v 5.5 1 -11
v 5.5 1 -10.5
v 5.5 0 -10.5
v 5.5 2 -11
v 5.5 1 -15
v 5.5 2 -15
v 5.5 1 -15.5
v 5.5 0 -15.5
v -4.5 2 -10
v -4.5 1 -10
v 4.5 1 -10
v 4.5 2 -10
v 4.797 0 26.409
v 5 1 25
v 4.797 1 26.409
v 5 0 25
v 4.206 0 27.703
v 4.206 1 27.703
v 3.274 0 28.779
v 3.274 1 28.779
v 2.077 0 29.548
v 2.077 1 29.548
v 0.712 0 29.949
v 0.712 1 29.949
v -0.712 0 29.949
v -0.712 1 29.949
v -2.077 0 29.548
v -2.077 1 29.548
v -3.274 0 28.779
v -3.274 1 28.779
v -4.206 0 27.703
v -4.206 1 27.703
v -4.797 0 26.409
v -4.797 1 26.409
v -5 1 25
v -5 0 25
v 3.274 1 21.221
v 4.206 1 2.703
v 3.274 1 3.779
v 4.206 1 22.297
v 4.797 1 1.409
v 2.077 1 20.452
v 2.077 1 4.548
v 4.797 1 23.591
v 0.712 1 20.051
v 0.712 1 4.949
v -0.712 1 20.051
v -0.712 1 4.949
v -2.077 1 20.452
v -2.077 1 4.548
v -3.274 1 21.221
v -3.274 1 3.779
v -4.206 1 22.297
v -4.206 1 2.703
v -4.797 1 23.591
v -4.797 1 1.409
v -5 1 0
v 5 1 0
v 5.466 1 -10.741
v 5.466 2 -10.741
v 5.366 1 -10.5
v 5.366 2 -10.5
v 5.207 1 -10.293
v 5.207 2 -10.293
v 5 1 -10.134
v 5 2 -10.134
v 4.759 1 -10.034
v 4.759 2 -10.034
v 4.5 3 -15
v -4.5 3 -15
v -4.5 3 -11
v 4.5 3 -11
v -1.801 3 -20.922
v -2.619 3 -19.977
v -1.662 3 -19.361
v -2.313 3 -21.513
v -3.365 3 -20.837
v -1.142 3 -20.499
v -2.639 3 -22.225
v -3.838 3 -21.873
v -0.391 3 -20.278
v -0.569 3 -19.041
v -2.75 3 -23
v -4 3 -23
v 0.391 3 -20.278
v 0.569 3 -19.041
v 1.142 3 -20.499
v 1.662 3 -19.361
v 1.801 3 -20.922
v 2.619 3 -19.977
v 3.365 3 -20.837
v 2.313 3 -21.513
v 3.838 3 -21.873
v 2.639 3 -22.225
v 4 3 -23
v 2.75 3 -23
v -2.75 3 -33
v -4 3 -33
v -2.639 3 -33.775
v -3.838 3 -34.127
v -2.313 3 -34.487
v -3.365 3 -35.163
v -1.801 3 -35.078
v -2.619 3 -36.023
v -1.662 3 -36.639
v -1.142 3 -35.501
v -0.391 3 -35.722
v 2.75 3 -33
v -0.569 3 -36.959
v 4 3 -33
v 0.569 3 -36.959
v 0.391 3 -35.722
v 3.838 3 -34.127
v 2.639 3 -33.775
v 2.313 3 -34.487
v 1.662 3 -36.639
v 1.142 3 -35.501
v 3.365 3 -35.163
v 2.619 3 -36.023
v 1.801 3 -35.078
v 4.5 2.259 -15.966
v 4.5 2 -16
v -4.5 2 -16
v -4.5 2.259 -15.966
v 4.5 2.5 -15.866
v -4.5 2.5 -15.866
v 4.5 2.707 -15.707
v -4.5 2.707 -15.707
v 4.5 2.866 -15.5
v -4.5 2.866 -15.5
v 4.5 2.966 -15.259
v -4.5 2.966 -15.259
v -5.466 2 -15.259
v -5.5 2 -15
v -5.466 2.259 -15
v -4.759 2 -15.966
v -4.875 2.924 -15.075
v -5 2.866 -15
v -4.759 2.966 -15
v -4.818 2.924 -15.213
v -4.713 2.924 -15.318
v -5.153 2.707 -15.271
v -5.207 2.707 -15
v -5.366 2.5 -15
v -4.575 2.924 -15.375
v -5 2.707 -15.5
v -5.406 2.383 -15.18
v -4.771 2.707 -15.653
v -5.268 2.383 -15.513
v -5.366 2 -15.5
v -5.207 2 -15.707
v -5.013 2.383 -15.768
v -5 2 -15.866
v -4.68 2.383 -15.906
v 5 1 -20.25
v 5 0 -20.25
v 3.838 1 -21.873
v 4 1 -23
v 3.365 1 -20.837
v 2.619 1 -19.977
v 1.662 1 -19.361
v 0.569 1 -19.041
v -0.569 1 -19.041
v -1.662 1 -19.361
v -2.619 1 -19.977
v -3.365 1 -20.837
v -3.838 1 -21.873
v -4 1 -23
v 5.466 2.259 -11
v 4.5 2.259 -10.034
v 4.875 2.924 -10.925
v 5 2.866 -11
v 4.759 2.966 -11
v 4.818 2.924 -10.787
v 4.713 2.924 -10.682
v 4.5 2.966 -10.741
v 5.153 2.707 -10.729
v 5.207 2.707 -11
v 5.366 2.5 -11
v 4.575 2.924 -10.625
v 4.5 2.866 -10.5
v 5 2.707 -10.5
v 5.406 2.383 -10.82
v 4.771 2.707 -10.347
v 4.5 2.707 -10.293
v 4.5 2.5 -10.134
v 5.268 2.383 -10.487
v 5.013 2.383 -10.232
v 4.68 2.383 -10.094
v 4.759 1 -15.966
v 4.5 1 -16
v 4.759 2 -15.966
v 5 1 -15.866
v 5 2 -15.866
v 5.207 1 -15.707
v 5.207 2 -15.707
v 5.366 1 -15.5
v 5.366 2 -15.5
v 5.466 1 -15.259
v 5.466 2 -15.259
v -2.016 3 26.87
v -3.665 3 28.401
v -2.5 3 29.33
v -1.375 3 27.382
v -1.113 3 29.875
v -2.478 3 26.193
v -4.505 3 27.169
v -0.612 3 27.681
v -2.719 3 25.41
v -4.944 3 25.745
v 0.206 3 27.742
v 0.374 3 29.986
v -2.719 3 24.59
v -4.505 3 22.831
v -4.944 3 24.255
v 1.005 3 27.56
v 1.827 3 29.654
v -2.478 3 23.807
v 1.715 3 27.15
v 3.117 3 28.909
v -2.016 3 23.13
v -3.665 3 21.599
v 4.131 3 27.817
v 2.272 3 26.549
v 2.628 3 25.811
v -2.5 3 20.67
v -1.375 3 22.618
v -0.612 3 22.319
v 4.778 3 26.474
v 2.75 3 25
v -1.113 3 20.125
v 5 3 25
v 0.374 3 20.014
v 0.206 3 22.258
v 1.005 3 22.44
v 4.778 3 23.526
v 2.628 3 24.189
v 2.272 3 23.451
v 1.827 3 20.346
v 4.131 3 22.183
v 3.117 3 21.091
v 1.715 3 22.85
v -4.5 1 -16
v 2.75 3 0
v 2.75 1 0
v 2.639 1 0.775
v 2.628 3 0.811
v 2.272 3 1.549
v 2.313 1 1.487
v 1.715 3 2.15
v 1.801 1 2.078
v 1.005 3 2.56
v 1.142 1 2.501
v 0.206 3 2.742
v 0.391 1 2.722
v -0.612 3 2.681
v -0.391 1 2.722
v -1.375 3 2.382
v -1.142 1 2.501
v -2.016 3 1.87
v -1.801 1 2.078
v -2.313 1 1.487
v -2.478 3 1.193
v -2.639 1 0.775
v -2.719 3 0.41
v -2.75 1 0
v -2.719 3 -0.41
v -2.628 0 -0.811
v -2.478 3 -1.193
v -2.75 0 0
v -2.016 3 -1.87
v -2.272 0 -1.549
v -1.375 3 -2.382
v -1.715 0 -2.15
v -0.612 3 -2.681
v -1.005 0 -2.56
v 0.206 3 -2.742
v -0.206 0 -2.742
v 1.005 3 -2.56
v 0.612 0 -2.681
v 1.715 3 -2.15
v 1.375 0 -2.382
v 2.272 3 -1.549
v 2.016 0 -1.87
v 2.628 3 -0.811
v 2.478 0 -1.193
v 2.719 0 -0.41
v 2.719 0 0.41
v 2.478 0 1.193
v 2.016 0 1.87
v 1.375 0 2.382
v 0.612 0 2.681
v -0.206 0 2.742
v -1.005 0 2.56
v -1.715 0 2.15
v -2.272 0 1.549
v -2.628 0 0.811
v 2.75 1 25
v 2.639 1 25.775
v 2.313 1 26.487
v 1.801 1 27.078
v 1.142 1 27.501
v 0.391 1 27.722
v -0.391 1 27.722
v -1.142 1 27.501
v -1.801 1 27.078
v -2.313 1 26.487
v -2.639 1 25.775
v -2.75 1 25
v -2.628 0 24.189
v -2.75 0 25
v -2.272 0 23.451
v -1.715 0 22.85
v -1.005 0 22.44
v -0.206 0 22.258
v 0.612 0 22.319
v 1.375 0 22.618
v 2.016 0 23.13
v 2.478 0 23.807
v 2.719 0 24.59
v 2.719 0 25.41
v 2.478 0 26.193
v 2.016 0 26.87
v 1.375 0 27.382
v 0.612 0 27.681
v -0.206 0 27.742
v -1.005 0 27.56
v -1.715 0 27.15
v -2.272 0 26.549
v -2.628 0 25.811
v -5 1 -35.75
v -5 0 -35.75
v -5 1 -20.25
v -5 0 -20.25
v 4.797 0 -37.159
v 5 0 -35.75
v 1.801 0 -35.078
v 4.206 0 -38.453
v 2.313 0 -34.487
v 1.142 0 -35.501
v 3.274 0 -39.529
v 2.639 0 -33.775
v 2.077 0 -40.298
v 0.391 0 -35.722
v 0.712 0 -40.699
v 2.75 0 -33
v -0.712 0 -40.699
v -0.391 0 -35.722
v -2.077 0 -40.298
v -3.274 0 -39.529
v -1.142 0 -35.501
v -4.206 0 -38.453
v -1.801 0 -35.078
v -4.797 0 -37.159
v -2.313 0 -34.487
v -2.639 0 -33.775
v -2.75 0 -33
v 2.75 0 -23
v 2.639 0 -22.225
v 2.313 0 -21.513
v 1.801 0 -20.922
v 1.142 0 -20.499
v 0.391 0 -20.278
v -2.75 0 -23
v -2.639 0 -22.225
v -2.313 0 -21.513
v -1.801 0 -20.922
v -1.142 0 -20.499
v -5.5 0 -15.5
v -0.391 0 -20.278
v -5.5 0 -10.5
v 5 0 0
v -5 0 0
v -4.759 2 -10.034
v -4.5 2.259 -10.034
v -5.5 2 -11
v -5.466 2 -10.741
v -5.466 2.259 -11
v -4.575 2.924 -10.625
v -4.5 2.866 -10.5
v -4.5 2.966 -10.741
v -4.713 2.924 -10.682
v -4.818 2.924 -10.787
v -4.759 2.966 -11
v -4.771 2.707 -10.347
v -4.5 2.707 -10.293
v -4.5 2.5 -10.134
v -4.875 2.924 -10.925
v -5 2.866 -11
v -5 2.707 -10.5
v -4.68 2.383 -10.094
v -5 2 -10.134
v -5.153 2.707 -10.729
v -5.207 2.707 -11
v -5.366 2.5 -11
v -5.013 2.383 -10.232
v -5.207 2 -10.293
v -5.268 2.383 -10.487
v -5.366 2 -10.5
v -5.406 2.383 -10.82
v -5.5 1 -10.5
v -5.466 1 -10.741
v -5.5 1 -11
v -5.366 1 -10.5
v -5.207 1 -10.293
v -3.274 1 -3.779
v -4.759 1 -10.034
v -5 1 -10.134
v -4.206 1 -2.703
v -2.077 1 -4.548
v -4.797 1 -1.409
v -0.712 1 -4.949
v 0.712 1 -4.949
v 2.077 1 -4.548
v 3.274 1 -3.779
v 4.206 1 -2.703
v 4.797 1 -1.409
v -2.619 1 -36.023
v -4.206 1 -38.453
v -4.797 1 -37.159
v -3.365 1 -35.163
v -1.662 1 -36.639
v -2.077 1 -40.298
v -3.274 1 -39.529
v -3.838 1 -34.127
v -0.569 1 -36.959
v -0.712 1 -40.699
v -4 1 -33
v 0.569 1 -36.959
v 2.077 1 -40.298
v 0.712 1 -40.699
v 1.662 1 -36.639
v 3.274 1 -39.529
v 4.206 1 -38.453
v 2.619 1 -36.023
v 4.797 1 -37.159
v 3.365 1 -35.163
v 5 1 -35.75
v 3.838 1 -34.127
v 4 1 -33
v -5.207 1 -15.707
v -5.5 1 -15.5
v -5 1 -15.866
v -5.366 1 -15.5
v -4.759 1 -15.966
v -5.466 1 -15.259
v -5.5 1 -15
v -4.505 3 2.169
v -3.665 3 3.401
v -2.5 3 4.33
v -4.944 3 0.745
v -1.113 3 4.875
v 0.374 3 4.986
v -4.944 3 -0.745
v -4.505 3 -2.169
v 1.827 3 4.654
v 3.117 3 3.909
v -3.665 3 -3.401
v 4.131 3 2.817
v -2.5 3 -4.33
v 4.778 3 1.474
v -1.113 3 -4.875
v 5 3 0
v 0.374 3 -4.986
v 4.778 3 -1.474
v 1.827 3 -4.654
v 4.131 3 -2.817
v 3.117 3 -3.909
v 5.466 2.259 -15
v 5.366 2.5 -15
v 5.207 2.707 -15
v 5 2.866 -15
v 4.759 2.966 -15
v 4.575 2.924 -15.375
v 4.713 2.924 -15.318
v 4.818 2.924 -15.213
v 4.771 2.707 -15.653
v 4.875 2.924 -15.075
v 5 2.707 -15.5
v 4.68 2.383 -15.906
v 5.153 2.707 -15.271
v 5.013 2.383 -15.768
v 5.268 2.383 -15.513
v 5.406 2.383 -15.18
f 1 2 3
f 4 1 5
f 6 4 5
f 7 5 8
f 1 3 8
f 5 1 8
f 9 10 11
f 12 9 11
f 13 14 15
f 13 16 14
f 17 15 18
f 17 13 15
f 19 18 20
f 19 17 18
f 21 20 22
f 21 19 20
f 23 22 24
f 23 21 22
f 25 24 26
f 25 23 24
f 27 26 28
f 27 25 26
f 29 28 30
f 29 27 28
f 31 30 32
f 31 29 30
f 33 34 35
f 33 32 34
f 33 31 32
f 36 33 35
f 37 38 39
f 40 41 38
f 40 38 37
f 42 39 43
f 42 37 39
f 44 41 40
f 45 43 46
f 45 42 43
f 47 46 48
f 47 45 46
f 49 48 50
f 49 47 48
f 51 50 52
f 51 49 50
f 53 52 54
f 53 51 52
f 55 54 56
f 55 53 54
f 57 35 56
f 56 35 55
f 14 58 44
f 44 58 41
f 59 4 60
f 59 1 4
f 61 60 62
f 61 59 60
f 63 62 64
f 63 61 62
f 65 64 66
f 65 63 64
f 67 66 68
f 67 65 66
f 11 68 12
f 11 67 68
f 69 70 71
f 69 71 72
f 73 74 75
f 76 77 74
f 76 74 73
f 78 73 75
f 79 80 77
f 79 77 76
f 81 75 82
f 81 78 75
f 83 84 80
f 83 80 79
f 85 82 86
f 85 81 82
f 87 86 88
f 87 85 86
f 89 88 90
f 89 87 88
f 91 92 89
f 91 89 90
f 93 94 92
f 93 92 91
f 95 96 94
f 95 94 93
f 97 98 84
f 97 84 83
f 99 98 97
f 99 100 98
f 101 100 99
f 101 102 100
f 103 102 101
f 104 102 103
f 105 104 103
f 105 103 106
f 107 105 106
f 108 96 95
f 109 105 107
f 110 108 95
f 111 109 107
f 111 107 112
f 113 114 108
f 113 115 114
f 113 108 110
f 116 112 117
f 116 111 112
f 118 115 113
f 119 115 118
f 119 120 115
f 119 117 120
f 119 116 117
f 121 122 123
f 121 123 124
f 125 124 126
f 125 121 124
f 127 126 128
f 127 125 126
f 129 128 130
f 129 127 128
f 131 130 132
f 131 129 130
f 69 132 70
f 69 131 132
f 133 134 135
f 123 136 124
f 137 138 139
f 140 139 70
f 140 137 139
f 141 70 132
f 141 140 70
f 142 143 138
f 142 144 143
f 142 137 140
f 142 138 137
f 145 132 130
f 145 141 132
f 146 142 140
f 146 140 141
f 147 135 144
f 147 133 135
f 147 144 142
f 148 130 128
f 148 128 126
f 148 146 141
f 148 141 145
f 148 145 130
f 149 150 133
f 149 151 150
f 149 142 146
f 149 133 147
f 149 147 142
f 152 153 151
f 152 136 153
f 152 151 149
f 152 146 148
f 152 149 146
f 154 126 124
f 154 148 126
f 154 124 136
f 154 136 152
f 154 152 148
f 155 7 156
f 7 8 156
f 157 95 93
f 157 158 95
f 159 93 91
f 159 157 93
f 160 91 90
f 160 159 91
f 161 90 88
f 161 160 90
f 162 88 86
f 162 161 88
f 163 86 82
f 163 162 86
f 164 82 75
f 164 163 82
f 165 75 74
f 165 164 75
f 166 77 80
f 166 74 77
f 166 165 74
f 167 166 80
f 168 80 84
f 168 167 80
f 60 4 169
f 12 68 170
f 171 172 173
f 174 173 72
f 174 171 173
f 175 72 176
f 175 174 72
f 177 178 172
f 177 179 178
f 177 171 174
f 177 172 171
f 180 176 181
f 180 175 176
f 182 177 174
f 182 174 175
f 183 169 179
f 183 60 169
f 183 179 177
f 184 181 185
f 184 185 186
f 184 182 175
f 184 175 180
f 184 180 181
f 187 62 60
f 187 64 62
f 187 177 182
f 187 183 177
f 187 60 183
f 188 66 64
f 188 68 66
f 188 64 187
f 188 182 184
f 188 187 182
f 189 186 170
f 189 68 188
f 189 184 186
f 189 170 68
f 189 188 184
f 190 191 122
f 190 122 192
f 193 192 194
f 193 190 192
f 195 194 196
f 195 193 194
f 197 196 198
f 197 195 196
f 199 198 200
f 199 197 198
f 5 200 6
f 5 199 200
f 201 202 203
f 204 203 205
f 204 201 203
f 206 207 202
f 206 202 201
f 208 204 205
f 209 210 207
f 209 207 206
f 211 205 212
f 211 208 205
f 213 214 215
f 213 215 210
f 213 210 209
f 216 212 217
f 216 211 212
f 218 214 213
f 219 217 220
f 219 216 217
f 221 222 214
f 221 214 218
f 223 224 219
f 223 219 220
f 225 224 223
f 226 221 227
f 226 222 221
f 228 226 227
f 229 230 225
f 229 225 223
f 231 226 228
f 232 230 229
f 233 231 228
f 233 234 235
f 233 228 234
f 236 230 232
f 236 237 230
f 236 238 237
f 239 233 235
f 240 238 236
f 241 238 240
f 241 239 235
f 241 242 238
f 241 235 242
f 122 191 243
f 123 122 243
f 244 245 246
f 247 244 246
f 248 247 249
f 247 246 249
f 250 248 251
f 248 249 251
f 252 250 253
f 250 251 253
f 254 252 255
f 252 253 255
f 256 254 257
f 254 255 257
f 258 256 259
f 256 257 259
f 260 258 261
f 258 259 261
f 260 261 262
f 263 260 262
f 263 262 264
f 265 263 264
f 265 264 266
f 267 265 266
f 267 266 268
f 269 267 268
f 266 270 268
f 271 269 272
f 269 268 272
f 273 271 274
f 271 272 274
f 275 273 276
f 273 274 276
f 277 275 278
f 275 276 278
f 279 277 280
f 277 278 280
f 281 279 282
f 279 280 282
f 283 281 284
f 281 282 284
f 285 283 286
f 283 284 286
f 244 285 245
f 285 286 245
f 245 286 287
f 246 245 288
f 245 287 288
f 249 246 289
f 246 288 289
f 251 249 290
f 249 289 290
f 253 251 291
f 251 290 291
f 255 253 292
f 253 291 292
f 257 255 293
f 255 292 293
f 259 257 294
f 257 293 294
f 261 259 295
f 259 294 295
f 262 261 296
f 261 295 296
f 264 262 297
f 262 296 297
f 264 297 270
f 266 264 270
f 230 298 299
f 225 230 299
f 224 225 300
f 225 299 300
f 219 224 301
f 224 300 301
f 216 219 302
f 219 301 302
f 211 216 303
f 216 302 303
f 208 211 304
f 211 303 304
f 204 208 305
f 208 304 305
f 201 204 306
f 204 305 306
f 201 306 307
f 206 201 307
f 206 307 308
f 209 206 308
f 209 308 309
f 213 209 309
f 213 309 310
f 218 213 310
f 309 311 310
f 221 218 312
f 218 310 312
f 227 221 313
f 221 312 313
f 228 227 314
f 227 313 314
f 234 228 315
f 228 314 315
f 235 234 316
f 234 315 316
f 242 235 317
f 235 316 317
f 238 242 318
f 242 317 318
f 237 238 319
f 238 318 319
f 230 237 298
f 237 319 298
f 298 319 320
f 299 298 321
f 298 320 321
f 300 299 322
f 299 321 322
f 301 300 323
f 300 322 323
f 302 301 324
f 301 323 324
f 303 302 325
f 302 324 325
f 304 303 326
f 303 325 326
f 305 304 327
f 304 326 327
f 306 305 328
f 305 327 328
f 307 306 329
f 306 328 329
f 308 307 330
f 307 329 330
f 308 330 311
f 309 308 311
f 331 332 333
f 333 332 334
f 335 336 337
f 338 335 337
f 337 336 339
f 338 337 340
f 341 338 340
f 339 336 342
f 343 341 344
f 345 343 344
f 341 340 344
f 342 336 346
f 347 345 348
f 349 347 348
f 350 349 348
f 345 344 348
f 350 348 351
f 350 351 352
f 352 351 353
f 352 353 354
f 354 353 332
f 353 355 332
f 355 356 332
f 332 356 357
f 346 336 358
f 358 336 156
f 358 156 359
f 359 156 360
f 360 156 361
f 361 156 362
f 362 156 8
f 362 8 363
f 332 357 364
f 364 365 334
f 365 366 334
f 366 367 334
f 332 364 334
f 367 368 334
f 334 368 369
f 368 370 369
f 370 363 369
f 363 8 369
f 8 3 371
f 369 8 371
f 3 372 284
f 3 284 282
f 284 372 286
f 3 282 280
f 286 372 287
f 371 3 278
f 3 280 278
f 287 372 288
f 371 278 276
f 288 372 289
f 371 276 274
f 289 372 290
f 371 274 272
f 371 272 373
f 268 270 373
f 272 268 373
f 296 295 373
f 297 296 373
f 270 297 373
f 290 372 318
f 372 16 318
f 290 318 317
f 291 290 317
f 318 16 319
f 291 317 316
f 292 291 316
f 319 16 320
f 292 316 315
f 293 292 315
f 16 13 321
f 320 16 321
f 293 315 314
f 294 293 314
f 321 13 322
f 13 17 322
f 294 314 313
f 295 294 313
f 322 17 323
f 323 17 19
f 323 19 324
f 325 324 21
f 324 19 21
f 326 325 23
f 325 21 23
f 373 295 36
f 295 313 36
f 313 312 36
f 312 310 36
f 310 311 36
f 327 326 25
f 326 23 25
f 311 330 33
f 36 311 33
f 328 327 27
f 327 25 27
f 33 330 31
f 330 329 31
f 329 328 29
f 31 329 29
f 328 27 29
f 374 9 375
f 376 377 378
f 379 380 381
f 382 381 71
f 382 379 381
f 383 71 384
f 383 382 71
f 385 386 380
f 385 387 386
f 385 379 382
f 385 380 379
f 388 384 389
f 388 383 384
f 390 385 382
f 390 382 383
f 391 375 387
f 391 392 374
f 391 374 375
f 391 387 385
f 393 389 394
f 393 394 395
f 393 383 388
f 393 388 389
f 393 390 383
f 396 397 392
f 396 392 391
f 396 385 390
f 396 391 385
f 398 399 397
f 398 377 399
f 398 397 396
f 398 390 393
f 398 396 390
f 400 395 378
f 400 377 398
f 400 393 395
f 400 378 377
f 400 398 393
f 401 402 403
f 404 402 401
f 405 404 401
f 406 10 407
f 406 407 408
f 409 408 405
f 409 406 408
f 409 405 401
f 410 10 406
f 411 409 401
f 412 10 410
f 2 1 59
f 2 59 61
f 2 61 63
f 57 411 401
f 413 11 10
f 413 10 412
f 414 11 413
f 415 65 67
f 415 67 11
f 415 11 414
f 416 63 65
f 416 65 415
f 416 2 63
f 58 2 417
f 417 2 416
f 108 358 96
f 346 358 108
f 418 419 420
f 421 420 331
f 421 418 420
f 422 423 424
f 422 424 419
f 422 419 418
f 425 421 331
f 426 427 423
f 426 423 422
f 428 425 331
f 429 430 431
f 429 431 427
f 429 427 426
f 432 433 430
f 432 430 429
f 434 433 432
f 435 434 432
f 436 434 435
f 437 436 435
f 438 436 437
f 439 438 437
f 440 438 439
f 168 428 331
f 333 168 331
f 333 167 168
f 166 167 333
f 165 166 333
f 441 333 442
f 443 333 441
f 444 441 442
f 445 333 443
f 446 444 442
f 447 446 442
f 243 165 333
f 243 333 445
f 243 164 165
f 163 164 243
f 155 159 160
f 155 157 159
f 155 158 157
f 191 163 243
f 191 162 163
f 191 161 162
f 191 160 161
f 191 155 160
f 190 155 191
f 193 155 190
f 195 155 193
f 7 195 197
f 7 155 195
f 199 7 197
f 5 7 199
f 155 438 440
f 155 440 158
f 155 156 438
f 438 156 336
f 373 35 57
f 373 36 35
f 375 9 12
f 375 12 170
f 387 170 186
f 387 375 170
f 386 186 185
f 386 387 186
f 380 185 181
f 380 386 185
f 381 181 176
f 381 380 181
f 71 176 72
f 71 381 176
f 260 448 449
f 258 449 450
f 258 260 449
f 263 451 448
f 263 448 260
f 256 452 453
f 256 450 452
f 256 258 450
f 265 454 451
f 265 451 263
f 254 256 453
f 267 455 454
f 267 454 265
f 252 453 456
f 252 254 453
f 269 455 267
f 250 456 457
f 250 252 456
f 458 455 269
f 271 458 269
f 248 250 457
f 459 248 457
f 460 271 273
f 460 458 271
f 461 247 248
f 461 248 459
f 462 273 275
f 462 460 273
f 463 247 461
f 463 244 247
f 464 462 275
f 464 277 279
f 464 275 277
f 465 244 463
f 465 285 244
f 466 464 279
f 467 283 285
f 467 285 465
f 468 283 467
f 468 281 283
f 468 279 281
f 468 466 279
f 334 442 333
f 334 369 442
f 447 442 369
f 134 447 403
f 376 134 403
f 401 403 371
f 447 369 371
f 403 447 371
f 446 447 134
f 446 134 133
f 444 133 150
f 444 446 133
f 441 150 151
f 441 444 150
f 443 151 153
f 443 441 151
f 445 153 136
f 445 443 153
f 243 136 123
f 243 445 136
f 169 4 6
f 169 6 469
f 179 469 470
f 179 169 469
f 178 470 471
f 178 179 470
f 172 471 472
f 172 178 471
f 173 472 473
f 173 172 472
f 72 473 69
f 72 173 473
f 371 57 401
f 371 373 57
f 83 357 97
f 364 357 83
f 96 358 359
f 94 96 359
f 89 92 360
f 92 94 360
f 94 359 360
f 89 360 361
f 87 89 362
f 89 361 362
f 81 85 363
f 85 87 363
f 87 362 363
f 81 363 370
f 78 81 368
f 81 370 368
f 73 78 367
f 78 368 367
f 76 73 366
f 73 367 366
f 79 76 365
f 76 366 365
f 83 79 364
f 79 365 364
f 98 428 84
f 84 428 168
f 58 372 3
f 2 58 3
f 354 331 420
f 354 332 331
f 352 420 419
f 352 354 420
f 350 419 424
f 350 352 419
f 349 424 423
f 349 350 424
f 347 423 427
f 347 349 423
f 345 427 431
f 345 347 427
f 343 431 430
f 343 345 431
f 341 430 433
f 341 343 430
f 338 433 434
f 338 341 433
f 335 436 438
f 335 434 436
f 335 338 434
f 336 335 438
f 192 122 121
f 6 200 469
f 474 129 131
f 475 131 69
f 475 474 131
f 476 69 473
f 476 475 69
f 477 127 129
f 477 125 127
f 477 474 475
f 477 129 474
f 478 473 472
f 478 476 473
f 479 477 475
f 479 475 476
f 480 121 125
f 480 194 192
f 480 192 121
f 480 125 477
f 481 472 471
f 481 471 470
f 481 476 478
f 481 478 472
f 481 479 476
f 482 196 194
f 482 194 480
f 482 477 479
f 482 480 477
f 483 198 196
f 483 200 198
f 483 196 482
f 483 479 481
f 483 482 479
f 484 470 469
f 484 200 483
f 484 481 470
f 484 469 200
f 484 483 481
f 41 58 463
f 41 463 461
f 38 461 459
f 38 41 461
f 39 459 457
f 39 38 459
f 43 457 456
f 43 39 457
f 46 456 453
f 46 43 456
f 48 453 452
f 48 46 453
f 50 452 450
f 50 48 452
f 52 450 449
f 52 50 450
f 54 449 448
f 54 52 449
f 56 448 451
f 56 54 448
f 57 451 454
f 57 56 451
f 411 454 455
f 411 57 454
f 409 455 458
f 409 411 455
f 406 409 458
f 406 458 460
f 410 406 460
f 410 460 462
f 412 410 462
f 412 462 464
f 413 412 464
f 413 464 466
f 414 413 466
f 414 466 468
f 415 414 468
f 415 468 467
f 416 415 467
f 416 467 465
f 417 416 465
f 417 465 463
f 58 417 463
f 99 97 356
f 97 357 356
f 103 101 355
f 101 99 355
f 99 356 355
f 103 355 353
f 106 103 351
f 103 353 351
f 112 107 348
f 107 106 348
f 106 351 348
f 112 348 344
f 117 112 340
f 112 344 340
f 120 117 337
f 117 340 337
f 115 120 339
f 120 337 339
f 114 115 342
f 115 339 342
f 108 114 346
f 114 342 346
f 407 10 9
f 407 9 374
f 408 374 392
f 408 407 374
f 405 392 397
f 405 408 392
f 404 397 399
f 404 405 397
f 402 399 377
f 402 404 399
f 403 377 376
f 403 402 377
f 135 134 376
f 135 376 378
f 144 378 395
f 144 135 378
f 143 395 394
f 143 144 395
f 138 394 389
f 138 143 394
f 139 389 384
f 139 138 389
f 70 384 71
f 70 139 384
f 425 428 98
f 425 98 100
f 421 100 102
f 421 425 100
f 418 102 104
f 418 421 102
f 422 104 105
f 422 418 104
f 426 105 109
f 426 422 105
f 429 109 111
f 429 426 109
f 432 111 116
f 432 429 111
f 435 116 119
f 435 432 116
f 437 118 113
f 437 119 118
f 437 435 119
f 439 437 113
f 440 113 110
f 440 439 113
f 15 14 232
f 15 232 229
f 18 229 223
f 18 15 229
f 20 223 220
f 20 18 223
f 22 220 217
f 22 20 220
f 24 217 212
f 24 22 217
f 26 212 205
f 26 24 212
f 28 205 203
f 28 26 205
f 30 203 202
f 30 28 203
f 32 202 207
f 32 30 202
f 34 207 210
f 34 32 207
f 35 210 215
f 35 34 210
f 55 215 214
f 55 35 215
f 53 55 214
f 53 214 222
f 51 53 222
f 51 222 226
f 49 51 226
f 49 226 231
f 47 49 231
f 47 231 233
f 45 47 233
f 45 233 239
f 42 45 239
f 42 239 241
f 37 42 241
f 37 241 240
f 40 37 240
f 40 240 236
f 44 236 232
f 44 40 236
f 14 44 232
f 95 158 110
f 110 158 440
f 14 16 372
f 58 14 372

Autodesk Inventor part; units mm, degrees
ref_plane "YZ Plane" through (0, 0, 0) normal (1, 0, 0) x (0, 1, 0)
ref_plane "XZ Plane" through (0, 0, 0) normal (0, 1, 0) x (-1, 0, 0)
ref_plane "XY Plane" through (0, 0, 0) normal (0, 0, 1) x (1, 0, 0)
sketch "Sketch15" plane through (0, 0, 0) normal (0, 1, 0) x (-1, 0, 0)
  circle A0 centre (0, 0) radius 2.75
  circle A1 centre (0, 0) radius 5
  line L0 (0, 0) -> (0, -28)
  line L1 (0, -33) -> (0, -23) construction
  line L2 (2.75, -33) -> (2.75, -23)
  line L3 (-2.75, -23) -> (-2.75, -33)
  arc A2 (-2.75, -33) -> (2.75, -33) centre (0, -33) ccw
  arc A3 (2.75, -23) -> (-2.75, -23) centre (0, -23) ccw
  line L4 (0, -43) -> (0, -13) construction
  line L5 (0, 0) -> (0, -14)
  line L6 (-5.5, -15.5) -> (5.5, -15.5)
  line L7 (5.5, -15.5) -> (5.5, -10.5)
  line L8 (5.5, -10.5) -> (-5.5, -10.5)
  line L9 (-5.5, -10.5) -> (-5.5, -15.5)
  line L10 (-5.5, -15.5) -> (5.5, -10.5) construction
  line L11 (5.5, -15.5) -> (-5.5, -10.5) construction
  line L12 (5, 0) -> (5.5, -10.5)
  line L13 (-5, 0) -> (-5.5, -10.5)
  line L14 (0, -35.75) -> (0, -20.25) construction
  line L15 (5, -35.75) -> (5, -20.25)
  line L16 (-5, -20.25) -> (-5, -35.75)
  arc A4 (-5, -35.75) -> (5, -35.75) centre (0, -35.75) ccw
  arc A5 (5, -20.25) -> (-5, -20.25) centre (0, -20.25) ccw
  line L17 (5.5, -15.5) -> (5, -20.25)
  line L18 (-5.5, -15.5) -> (-5, -20.25)
  line L19 (0, 0) -> (0, 25)
  circle A6 centre (0, 25) radius 2.75
  circle A7 centre (0, 25) radius 5
  line L20 (0, 25) -> (5, 25)
  line L21 (0, 25) -> (-5, 25)
  line L22 (5, 25) -> (5, 0)
  line L23 (-5, 25) -> (-5, 0)
  point P0 (-1.5612, -15.5)
  point P1 (1.5612, -15.5)
  dimension "d102" = 5.5
  dimension "d103" = 10
  dimension "d104" = 28
  dimension "d105" = 5
  dimension "d106" = 5.5
  dimension "d107" = 15
  dimension "d109" = 14
  dimension "d110" = 11
  dimension "d111" = 5
  dimension "d112" = 10
  dimension "d133" = 25
  dimension "d134" = 5.5
  dimension "d135" = 10
extrude "Extrusion14" add sketch "Sketch15" along normal blind 1 contours A0 L19 A1 L0 | A0 L0 A1 L19 | L19 A7 L22 A1 | A1 L23 A7 L19 | L0 L8 L13 A1 | A1 L12 L8 L0 | A7 L21 A6 L19 | L19 A6 L20 A7 | L8 L7 L6 A5 L0 | L0 A5 L6 L9 L8 | L20 A6 L21 A7 | L17 A5 L6 | L6 A5 L18 | A5 L6 L0 | L0 L6 A5 | A5 L15 A4 L16 L6
sketch "Sketch16" plane through (0, 1, 0) normal (0, 1, 0) x (1, 0, 0)
  circle A0 centre (0, 0) radius 2.75 projected
  circle A1 centre (0, 0) radius 2.75
  arc A2 (-5, 0) -> (5, 0) centre (0, 0) ccw projected
  circle A3 centre (0, 0) radius 5
  line L0 (-2.75, 23) -> (-2.75, 33) projected
  line L1 (-2.75, 28) -> (0, 28)
  line L2 (0, 33) -> (0, 23) construction
  line L3 (-2.75, 33) -> (-2.75, 23)
  line L4 (2.75, 23) -> (2.75, 33)
  arc A4 (2.75, 33) -> (-2.75, 33) centre (0, 33) ccw
  arc A5 (-2.75, 23) -> (2.75, 23) centre (0, 23) ccw
  line L5 (0, 33) -> (0, 23) construction
  line L6 (-4, 33) -> (-4, 23)
  line L7 (4, 23) -> (4, 33)
  arc A6 (4, 33) -> (-4, 33) centre (0, 33) ccw
  arc A7 (-4, 23) -> (4, 23) centre (0, 23) ccw
  circle A8 centre (0, -25) radius 2.75 projected
  circle A9 centre (0, -25) radius 2.75
  circle A10 centre (0, -25) radius 5
  point P0 (5, 0)
  dimension "d115" = 5
  dimension "d116" = 5.5
  dimension "d117" = 5
  dimension "d118" = 8
  dimension "d136" = 5.5
  dimension "d137" = 10
extrude "Extrusion15" add sketch "Sketch16" along normal blind 2
sketch "Sketch17" plane through (0, 1, 0) normal (0, 1, 0) x (1, 0, 0)
  line L0 (0, 0) -> (0, 13)
  line L1 (5.5, 16) -> (-5.5, 16)
  line L2 (-5.5, 16) -> (-5.5, 10)
  line L3 (-5.5, 10) -> (5.5, 10)
  line L4 (5.5, 10) -> (5.5, 16)
  line L5 (5.5, 16) -> (-5.5, 10) construction
  line L6 (-5.5, 16) -> (5.5, 10) construction
  dimension "d121" = 13
  dimension "d129" = 11
  dimension "d130" = 6
extrude "Extrusion16" add sketch "Sketch17" along normal blind 2
fillet "Fillet7" radius 1 4 edges at (-5.5, 2, -10) (-5.5, 2, -16) (5.5, 2, -10) (5.5, 2, -16)
fillet "Fillet8" radius 1 8 edges at (5.2071, 3, -10.2929) (5.5, 3, -13) (5.2071, 3, -15.7071) (0, 3, -16) (-5.2071, 3, -15.7071) (-5.5, 3, -13) (-5.2071, 3, -10.2929) (0, 3, -10)
properties part number "Belt_Restraint"
